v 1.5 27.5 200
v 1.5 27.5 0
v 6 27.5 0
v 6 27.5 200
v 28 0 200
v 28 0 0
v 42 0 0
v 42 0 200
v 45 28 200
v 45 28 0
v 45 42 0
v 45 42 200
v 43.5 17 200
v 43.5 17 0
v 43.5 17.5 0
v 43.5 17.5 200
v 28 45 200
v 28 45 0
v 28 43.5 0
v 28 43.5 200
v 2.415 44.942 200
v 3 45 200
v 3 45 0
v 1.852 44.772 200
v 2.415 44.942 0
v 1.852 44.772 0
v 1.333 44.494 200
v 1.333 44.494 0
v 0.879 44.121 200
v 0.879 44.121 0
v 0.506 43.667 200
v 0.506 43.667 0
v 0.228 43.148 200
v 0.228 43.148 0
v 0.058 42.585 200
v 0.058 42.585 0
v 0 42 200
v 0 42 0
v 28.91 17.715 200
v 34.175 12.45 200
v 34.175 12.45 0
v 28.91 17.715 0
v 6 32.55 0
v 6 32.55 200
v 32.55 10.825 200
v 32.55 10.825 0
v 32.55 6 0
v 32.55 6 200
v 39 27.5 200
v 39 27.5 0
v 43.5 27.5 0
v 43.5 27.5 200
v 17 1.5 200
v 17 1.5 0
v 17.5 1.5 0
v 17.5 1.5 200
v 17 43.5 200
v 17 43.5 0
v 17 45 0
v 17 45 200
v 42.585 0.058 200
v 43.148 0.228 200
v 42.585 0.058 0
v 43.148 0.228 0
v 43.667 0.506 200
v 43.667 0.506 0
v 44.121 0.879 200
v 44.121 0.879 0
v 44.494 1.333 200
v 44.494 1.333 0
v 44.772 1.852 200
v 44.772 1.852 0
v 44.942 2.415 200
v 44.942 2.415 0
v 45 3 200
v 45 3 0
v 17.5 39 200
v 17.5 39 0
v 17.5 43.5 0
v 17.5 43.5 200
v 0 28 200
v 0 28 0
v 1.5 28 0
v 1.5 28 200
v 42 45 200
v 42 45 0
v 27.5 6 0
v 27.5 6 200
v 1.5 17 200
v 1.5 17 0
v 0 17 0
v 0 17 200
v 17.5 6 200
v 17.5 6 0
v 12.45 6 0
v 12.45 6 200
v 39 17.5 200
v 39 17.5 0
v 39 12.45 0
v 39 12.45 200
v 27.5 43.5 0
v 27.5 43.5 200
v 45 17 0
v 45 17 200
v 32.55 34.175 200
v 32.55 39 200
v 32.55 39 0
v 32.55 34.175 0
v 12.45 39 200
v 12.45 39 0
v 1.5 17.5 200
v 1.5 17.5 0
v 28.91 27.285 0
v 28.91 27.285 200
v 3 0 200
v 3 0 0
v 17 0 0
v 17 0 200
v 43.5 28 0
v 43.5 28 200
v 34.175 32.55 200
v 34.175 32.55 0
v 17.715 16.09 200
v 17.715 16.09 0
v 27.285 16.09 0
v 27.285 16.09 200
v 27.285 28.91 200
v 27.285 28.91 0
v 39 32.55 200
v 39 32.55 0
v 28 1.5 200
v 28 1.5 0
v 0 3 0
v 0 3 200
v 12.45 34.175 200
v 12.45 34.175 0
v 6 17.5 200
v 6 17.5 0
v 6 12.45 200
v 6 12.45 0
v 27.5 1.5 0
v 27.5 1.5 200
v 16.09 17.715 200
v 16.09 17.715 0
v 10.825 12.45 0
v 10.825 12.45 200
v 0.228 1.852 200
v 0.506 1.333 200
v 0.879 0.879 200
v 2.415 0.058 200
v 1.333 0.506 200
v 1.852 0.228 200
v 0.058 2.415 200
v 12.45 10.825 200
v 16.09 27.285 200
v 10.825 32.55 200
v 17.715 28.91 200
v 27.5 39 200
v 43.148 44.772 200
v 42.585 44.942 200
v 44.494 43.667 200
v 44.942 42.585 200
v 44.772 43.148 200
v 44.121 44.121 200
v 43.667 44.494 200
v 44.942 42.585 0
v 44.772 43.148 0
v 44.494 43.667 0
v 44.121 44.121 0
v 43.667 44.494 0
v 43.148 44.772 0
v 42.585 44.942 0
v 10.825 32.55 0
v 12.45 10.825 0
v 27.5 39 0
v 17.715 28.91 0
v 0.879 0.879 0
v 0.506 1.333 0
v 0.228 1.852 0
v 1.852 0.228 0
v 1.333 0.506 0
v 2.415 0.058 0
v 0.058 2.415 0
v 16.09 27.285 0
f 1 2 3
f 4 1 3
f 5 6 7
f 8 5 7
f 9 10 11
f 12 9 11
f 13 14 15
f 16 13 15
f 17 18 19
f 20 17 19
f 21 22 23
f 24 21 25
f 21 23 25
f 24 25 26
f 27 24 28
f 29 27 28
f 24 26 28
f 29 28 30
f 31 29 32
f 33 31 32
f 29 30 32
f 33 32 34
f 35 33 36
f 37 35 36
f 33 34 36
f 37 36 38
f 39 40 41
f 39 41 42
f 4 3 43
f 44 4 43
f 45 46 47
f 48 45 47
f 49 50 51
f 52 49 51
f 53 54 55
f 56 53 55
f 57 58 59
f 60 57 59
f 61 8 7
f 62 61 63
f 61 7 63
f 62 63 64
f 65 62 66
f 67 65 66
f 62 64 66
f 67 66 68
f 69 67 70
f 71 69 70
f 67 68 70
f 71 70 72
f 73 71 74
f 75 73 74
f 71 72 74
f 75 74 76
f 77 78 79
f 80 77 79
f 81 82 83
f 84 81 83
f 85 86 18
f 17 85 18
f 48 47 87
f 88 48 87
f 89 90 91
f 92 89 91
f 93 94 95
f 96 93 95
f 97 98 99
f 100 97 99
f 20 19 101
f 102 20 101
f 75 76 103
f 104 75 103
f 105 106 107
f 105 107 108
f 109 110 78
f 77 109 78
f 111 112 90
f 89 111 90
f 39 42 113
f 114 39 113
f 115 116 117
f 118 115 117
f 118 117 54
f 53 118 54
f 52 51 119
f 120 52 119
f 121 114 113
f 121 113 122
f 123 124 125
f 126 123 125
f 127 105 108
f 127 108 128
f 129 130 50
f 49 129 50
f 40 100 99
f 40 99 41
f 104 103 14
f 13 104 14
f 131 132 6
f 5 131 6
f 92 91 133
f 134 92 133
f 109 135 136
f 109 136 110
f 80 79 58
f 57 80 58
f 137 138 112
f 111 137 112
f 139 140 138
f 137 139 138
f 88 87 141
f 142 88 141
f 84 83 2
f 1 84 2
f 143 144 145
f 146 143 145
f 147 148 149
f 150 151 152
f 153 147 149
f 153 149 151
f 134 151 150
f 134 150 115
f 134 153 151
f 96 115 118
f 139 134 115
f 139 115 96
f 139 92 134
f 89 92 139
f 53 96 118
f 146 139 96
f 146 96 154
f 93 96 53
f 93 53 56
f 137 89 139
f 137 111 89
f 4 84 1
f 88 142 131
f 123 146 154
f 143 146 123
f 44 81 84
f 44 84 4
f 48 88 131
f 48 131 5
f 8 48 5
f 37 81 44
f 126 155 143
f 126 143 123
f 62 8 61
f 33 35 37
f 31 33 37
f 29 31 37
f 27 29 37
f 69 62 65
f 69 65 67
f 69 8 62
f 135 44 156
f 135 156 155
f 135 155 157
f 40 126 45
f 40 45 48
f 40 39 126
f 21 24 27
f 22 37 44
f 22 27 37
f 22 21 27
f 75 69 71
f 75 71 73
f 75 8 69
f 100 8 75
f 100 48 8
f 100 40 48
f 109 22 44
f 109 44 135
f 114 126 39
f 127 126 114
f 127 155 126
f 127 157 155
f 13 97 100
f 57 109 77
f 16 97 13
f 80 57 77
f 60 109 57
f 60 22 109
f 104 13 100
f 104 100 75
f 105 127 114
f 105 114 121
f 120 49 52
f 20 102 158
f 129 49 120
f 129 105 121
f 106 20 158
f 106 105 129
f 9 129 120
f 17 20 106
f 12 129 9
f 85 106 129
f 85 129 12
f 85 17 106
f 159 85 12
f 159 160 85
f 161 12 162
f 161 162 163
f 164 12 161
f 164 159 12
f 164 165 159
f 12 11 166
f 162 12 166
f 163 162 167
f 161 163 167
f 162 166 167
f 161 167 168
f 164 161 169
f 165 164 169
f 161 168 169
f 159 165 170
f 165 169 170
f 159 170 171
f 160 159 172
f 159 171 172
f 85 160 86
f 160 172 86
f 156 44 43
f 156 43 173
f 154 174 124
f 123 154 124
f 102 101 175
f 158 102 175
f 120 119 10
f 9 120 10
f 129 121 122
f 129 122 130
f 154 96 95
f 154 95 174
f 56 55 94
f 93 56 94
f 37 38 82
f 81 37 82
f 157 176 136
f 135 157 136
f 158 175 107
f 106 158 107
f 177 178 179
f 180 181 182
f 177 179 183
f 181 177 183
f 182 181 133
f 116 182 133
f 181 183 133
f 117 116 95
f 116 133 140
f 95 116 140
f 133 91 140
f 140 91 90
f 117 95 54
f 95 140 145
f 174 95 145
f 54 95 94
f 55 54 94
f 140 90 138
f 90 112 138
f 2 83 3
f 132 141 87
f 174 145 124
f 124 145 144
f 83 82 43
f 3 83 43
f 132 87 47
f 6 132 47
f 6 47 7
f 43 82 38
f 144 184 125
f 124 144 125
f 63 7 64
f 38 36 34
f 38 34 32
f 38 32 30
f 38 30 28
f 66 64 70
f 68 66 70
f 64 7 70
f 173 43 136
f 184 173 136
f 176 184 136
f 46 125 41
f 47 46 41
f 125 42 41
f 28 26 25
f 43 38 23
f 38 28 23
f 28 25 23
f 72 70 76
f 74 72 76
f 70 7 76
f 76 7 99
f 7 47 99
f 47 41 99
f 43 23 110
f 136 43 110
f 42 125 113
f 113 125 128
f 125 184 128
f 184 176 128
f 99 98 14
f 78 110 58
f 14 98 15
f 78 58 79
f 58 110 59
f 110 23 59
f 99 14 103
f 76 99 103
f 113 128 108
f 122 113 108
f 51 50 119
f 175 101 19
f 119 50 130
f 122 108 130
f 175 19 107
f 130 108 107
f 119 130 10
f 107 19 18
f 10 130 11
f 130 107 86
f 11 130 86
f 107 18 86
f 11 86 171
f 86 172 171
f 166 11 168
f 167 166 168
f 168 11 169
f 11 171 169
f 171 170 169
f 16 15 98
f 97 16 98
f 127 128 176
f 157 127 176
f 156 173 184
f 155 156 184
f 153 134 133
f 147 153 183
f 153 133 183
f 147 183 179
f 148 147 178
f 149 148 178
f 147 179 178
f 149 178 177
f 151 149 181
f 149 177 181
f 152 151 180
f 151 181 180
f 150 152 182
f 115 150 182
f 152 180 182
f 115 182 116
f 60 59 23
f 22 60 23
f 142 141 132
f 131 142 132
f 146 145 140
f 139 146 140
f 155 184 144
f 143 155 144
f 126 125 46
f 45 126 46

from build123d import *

# Parameters (mm, degrees)
BOSS_EXTRUDE1_DEPTH = 200


with BuildPart() as part:
    # Sketch1 → Boss-Extrude1 (new body)
    with BuildSketch(Plane.XY):
        with BuildLine():
            Line((17.715117093, 28.909882907), (12.45, 34.175))
            Line((12.45, 34.175), (12.45, 39))
            Line((12.45, 39), (17.5, 39))
            Line((17.5, 39), (17.5, 43.5))
            Line((17.5, 43.5), (17, 43.5))
            Line((17, 43.5), (17, 45))
            Line((17, 45), (3, 45))
            ThreePointArc((3, 45), (0.878679656, 44.121320344), (0, 42))
            Line((0, 42), (0, 28))
            Line((0, 28), (1.5, 28))
            Line((1.5, 28), (1.5, 27.5))
            Line((1.5, 27.5), (6, 27.5))
            Line((6, 27.5), (6, 32.55))
            Line((6, 32.55), (10.825, 32.55))
            Line((10.825, 32.55), (16.090117093, 27.284882907))
            Line((16.090117093, 27.284882907), (16.090117093, 17.715117093))
            Line((16.090117093, 17.715117093), (10.825, 12.45))
            Line((10.825, 12.45), (6, 12.45))
            Line((6, 12.45), (6, 17.5))
            Line((6, 17.5), (1.5, 17.5))
            Line((1.5, 17.5), (1.5, 17))
            Line((1.5, 17), (0, 17))
            Line((0, 17), (0, 3))
            ThreePointArc((0, 3), (0.878679656, 0.878679656), (3, 0))
            Line((3, 0), (17, 0))
            Line((17, 0), (17, 1.5))
            Line((17, 1.5), (17.5, 1.5))
            Line((17.5, 1.5), (17.5, 6))
            Line((17.5, 6), (12.45, 6))
            Line((12.45, 6), (12.45, 10.825))
            Line((12.45, 10.825), (17.715117093, 16.090117093))
            Line((17.715117093, 16.090117093), (27.284882907, 16.090117093))
            Line((27.284882907, 16.090117093), (32.55, 10.825))
            Line((32.55, 10.825), (32.55, 6))
            Line((32.55, 6), (27.5, 6))
            Line((27.5, 6), (27.5, 1.5))
            Line((27.5, 1.5), (28, 1.5))
            Line((28, 1.5), (28, 0))
            Line((28, 0), (42, 0))
            ThreePointArc((42, 0), (44.121320344, 0.878679656), (45, 3))
            Line((45, 3), (45, 17))
            Line((45, 17), (43.5, 17))
            Line((43.5, 17), (43.5, 17.5))
            Line((43.5, 17.5), (39, 17.5))
            Line((39, 17.5), (39, 12.45))
            Line((39, 12.45), (34.175, 12.45))
            Line((34.175, 12.45), (28.909882907, 17.715117093))
            Line((28.909882907, 17.715117093), (28.909882907, 27.284882907))
            Line((28.909882907, 27.284882907), (34.175, 32.55))
            Line((34.175, 32.55), (39, 32.55))
            Line((39, 32.55), (39, 27.5))
            Line((39, 27.5), (43.5, 27.5))
            Line((43.5, 27.5), (43.5, 28))
            Line((43.5, 28), (45, 28))
            Line((45, 28), (45, 42))
            ThreePointArc((45, 42), (44.121320344, 44.121320344), (42, 45))
            Line((42, 45), (28, 45))
            Line((28, 45), (28, 43.5))
            Line((28, 43.5), (27.5, 43.5))
            Line((27.5, 43.5), (27.5, 39))
            Line((27.5, 39), (32.55, 39))
            Line((32.55, 39), (32.55, 34.175))
            Line((32.55, 34.175), (27.284882907, 28.909882907))
            Line((27.284882907, 28.909882907), (17.715117093, 28.909882907))
        make_face()
    extrude(amount=BOSS_EXTRUDE1_DEPTH)


solid = part.part
